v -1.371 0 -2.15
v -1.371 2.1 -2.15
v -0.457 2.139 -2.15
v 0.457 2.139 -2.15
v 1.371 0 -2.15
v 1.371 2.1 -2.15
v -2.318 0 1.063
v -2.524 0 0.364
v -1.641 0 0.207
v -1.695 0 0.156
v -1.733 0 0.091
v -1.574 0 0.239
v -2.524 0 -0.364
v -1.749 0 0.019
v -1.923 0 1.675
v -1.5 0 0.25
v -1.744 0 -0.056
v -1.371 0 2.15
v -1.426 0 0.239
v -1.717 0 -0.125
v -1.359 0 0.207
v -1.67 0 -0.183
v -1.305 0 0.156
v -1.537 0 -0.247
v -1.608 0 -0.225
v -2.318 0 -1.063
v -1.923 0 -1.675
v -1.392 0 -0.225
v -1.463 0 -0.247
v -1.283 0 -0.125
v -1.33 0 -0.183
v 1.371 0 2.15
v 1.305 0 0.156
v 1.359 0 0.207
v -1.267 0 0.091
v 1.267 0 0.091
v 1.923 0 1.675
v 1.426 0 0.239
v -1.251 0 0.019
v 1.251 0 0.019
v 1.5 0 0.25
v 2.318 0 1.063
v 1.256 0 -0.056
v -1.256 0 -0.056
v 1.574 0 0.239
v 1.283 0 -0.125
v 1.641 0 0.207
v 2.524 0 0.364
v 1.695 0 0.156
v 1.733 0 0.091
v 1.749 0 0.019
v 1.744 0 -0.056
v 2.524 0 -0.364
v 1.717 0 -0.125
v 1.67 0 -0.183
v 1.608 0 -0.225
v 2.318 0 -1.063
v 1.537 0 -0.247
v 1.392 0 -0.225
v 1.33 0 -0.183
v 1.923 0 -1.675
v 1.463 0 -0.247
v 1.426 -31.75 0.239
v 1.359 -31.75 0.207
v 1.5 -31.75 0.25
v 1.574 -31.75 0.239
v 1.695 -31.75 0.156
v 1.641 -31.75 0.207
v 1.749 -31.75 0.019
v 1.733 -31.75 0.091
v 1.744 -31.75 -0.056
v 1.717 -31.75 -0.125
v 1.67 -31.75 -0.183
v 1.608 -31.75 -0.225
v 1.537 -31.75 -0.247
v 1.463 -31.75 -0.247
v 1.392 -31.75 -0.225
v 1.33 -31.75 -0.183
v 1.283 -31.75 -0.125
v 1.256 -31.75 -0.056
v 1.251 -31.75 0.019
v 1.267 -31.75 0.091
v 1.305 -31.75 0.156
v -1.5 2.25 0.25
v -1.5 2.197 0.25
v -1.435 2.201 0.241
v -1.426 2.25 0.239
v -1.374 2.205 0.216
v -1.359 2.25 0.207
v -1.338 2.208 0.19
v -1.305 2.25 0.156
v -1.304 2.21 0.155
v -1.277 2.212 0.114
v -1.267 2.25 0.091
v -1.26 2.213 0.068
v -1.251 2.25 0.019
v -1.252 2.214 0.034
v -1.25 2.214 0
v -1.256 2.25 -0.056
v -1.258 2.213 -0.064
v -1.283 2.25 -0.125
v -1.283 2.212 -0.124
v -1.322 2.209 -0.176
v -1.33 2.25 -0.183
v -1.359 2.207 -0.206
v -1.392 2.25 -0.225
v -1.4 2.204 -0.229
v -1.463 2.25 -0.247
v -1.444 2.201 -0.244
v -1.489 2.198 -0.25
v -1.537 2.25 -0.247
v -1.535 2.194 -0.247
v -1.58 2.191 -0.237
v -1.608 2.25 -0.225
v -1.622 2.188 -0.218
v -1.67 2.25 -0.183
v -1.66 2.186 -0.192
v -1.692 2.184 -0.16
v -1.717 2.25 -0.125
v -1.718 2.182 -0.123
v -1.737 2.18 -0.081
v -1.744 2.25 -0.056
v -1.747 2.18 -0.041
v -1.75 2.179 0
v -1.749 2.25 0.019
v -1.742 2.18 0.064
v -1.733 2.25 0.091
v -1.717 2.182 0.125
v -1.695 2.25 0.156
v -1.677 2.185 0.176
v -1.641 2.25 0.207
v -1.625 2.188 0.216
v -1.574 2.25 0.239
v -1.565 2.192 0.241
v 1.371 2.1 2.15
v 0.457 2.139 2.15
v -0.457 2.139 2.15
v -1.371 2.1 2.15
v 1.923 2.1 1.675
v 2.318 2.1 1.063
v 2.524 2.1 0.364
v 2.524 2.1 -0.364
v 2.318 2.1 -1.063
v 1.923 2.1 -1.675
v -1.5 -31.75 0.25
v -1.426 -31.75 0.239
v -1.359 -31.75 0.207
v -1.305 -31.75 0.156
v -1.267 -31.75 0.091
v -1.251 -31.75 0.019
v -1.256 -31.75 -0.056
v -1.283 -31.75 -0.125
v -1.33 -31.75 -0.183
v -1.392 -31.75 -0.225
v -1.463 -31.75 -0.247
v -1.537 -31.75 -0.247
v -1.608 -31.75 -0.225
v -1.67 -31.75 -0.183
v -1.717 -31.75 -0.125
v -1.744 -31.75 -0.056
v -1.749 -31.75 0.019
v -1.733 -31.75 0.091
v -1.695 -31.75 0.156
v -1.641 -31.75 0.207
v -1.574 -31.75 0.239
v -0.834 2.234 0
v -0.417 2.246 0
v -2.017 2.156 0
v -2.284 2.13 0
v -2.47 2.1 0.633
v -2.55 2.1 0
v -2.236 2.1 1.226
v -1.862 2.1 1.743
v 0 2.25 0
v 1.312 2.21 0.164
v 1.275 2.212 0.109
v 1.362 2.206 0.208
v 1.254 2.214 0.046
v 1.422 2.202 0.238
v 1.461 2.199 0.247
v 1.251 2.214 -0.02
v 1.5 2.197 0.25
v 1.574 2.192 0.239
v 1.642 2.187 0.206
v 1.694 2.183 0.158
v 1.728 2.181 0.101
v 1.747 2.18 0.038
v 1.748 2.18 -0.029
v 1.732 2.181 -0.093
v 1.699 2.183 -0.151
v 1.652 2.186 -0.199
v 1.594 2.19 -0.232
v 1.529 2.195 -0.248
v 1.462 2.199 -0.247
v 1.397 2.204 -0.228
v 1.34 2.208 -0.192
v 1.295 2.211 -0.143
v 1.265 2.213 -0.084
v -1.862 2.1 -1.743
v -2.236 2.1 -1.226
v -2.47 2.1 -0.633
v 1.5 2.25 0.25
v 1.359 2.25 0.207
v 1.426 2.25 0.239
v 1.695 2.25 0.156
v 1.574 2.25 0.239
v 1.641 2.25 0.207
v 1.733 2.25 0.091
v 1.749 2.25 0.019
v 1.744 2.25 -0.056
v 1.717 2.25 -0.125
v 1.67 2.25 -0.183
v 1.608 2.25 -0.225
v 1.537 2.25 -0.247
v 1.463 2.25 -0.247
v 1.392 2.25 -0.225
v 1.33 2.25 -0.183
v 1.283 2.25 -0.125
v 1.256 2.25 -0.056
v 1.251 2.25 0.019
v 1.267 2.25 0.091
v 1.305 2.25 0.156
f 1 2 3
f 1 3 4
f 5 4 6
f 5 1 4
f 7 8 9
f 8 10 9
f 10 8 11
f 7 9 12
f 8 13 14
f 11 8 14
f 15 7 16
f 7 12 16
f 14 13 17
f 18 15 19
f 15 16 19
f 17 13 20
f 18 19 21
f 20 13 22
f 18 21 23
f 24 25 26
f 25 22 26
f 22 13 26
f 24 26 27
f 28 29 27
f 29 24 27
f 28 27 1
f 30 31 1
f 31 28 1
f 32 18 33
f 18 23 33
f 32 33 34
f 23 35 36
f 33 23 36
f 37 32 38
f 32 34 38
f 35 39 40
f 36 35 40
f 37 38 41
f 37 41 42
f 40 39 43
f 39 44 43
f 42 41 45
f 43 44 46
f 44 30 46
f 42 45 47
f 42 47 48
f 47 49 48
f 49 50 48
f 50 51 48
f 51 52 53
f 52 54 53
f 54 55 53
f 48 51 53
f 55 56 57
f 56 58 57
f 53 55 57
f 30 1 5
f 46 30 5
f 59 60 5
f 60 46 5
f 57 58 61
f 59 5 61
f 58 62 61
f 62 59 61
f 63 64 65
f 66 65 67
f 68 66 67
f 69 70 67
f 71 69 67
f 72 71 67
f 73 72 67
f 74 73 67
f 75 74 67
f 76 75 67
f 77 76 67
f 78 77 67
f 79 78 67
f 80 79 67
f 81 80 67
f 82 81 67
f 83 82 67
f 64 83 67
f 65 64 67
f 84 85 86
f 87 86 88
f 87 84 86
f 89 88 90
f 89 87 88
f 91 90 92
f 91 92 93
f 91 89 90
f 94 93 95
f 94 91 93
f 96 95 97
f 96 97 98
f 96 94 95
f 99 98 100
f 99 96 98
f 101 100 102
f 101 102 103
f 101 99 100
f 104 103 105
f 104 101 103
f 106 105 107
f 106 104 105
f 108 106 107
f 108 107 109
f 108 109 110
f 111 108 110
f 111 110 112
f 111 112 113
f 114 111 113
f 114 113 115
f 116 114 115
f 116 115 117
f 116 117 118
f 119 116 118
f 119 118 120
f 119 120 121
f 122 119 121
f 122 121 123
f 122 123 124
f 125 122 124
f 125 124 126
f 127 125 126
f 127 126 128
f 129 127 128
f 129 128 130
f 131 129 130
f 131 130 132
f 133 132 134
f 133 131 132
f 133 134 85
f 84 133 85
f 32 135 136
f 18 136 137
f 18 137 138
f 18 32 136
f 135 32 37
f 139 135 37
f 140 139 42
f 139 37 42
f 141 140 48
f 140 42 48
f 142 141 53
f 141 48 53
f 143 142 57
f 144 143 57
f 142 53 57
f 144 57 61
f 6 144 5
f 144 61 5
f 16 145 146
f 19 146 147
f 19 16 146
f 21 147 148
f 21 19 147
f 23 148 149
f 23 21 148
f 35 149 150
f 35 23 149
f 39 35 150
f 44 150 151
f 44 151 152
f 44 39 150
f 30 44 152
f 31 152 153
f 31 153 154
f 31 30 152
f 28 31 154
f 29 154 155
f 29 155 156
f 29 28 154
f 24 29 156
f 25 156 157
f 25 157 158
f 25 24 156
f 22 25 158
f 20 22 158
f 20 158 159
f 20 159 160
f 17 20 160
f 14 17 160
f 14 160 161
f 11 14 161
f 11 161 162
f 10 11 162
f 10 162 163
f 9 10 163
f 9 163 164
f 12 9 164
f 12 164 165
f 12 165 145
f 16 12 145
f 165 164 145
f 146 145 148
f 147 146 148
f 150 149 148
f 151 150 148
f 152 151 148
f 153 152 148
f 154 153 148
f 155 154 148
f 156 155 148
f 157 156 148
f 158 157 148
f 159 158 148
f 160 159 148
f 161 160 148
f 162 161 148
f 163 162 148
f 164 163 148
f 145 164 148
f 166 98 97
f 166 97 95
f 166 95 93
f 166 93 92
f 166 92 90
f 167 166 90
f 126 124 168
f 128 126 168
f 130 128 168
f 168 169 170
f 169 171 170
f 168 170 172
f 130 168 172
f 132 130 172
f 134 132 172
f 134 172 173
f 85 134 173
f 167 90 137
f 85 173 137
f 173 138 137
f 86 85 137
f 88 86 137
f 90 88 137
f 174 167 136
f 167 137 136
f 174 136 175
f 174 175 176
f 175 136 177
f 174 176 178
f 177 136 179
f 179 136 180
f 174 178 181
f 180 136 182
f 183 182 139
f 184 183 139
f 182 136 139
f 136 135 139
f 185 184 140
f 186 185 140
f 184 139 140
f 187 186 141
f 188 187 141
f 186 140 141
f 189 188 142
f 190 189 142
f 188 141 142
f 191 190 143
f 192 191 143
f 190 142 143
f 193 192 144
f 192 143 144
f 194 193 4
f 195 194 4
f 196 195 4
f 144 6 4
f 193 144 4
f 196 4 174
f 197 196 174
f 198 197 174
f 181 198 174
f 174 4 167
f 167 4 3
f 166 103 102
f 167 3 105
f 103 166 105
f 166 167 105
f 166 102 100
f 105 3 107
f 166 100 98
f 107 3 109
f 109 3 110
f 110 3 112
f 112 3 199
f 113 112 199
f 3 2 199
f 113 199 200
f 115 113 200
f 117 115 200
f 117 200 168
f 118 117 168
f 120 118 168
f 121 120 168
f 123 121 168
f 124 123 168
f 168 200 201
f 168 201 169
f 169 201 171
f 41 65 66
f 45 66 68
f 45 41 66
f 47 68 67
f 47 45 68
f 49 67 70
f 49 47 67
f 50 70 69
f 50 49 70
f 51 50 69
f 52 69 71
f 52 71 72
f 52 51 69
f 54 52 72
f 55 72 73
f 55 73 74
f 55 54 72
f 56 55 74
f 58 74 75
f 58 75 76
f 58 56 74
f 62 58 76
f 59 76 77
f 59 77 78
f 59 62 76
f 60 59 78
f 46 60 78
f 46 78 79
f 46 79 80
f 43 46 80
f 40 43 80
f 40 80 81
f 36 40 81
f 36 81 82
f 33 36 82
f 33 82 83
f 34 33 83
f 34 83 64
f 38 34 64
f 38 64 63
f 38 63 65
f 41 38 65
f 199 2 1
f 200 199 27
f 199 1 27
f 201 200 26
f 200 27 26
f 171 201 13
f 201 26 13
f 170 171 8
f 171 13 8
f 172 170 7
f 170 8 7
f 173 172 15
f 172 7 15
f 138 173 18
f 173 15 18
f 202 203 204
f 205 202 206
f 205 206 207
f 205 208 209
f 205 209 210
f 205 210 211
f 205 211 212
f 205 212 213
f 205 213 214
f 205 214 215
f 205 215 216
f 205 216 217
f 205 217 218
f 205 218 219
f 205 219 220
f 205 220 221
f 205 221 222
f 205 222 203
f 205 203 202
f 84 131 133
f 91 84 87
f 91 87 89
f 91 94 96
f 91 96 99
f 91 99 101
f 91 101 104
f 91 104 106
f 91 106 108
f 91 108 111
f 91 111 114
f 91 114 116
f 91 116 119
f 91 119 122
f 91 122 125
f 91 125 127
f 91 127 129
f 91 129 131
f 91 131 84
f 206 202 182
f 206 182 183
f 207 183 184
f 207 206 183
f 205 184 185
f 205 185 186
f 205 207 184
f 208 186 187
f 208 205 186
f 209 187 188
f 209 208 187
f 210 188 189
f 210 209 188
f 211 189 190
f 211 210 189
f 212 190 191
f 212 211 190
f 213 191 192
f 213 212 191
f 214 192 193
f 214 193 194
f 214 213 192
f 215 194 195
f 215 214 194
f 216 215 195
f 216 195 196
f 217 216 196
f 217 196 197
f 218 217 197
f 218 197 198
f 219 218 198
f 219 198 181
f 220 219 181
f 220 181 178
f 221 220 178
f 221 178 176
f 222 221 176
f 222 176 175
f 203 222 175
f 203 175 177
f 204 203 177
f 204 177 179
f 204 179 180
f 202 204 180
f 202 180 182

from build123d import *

# Parameters (mm, degrees)
BOSS_EXTRU_1_DEPTH      = 2.1
ESQUISSE3_W             = 2.74226184
ESQUISSE3_H             = 0.472482842
ENL_V_MAT_EXTRU_1_DEPTH = 2.1
ESQUISSE5_R             = 0.25
BOSS_EXTRU_2_DEPTH      = 34


with BuildPart() as part:
    # Esquisse1 → Boss.-Extru.1 (new body)
    with BuildSketch(Plane(origin=(0, 0, 0), x_dir=(1, 0, 0), z_dir=(0, 1, 0))):
        with BuildLine():
            Line((-1.37113092, -2.15), (1.37113092, -2.15))
            ThreePointArc((1.37113092, -2.15), (2.55, 0), (1.37113092, 2.15))
            Line((1.37113092, 2.15), (-1.37113092, 2.15))
            ThreePointArc((-1.37113092, 2.15), (-2.55, 0), (-1.37113092, -2.15))
        make_face()
    extrude(amount=BOSS_EXTRU_1_DEPTH)

    # Esquisse2 → Révolution1 (revolve)
    with BuildSketch(Plane.XY):
        with BuildLine():
            Line((0, 2.1), (0, 2.25))
            ThreePointArc((0, 2.25), (-1.277203977, 2.212467617), (-2.55, 2.1))
            Line((-2.55, 2.1), (0, 2.1))
        make_face()
    revolve(axis=Axis((0, 2.1, 0), (0, 1, 0)))

    # Esquisse3 → Enlèv. mat.-Extru.1 (cut)
    with BuildSketch(Plane.XZ.offset(-2.1)):
        with Locations((0, -2.386241421)):
            Rectangle(ESQUISSE3_W, ESQUISSE3_H)
        Polygon((-1.37113092, 2.15), (-1.37113092, 2.636321801), (1.307781681, 2.636321801), (1.37113092, 2.15), align=None)
    extrude(amount=-ENL_V_MAT_EXTRU_1_DEPTH, mode=Mode.SUBTRACT)

    # Esquisse5 → Boss.-Extru.2 (add)
    with BuildSketch(Plane(origin=(0, 2.25, 0), x_dir=(1, 0, 0), z_dir=(0, 1, 0))):
        with Locations(Location((-1.5, 0, 0), (0, 0, 270))):
            Circle(ESQUISSE5_R)
        with Locations(Location((1.5, 0, 0), (0, 0, 270))):
            Circle(ESQUISSE5_R)
    extrude(amount=-BOSS_EXTRU_2_DEPTH)


solid = part.part
